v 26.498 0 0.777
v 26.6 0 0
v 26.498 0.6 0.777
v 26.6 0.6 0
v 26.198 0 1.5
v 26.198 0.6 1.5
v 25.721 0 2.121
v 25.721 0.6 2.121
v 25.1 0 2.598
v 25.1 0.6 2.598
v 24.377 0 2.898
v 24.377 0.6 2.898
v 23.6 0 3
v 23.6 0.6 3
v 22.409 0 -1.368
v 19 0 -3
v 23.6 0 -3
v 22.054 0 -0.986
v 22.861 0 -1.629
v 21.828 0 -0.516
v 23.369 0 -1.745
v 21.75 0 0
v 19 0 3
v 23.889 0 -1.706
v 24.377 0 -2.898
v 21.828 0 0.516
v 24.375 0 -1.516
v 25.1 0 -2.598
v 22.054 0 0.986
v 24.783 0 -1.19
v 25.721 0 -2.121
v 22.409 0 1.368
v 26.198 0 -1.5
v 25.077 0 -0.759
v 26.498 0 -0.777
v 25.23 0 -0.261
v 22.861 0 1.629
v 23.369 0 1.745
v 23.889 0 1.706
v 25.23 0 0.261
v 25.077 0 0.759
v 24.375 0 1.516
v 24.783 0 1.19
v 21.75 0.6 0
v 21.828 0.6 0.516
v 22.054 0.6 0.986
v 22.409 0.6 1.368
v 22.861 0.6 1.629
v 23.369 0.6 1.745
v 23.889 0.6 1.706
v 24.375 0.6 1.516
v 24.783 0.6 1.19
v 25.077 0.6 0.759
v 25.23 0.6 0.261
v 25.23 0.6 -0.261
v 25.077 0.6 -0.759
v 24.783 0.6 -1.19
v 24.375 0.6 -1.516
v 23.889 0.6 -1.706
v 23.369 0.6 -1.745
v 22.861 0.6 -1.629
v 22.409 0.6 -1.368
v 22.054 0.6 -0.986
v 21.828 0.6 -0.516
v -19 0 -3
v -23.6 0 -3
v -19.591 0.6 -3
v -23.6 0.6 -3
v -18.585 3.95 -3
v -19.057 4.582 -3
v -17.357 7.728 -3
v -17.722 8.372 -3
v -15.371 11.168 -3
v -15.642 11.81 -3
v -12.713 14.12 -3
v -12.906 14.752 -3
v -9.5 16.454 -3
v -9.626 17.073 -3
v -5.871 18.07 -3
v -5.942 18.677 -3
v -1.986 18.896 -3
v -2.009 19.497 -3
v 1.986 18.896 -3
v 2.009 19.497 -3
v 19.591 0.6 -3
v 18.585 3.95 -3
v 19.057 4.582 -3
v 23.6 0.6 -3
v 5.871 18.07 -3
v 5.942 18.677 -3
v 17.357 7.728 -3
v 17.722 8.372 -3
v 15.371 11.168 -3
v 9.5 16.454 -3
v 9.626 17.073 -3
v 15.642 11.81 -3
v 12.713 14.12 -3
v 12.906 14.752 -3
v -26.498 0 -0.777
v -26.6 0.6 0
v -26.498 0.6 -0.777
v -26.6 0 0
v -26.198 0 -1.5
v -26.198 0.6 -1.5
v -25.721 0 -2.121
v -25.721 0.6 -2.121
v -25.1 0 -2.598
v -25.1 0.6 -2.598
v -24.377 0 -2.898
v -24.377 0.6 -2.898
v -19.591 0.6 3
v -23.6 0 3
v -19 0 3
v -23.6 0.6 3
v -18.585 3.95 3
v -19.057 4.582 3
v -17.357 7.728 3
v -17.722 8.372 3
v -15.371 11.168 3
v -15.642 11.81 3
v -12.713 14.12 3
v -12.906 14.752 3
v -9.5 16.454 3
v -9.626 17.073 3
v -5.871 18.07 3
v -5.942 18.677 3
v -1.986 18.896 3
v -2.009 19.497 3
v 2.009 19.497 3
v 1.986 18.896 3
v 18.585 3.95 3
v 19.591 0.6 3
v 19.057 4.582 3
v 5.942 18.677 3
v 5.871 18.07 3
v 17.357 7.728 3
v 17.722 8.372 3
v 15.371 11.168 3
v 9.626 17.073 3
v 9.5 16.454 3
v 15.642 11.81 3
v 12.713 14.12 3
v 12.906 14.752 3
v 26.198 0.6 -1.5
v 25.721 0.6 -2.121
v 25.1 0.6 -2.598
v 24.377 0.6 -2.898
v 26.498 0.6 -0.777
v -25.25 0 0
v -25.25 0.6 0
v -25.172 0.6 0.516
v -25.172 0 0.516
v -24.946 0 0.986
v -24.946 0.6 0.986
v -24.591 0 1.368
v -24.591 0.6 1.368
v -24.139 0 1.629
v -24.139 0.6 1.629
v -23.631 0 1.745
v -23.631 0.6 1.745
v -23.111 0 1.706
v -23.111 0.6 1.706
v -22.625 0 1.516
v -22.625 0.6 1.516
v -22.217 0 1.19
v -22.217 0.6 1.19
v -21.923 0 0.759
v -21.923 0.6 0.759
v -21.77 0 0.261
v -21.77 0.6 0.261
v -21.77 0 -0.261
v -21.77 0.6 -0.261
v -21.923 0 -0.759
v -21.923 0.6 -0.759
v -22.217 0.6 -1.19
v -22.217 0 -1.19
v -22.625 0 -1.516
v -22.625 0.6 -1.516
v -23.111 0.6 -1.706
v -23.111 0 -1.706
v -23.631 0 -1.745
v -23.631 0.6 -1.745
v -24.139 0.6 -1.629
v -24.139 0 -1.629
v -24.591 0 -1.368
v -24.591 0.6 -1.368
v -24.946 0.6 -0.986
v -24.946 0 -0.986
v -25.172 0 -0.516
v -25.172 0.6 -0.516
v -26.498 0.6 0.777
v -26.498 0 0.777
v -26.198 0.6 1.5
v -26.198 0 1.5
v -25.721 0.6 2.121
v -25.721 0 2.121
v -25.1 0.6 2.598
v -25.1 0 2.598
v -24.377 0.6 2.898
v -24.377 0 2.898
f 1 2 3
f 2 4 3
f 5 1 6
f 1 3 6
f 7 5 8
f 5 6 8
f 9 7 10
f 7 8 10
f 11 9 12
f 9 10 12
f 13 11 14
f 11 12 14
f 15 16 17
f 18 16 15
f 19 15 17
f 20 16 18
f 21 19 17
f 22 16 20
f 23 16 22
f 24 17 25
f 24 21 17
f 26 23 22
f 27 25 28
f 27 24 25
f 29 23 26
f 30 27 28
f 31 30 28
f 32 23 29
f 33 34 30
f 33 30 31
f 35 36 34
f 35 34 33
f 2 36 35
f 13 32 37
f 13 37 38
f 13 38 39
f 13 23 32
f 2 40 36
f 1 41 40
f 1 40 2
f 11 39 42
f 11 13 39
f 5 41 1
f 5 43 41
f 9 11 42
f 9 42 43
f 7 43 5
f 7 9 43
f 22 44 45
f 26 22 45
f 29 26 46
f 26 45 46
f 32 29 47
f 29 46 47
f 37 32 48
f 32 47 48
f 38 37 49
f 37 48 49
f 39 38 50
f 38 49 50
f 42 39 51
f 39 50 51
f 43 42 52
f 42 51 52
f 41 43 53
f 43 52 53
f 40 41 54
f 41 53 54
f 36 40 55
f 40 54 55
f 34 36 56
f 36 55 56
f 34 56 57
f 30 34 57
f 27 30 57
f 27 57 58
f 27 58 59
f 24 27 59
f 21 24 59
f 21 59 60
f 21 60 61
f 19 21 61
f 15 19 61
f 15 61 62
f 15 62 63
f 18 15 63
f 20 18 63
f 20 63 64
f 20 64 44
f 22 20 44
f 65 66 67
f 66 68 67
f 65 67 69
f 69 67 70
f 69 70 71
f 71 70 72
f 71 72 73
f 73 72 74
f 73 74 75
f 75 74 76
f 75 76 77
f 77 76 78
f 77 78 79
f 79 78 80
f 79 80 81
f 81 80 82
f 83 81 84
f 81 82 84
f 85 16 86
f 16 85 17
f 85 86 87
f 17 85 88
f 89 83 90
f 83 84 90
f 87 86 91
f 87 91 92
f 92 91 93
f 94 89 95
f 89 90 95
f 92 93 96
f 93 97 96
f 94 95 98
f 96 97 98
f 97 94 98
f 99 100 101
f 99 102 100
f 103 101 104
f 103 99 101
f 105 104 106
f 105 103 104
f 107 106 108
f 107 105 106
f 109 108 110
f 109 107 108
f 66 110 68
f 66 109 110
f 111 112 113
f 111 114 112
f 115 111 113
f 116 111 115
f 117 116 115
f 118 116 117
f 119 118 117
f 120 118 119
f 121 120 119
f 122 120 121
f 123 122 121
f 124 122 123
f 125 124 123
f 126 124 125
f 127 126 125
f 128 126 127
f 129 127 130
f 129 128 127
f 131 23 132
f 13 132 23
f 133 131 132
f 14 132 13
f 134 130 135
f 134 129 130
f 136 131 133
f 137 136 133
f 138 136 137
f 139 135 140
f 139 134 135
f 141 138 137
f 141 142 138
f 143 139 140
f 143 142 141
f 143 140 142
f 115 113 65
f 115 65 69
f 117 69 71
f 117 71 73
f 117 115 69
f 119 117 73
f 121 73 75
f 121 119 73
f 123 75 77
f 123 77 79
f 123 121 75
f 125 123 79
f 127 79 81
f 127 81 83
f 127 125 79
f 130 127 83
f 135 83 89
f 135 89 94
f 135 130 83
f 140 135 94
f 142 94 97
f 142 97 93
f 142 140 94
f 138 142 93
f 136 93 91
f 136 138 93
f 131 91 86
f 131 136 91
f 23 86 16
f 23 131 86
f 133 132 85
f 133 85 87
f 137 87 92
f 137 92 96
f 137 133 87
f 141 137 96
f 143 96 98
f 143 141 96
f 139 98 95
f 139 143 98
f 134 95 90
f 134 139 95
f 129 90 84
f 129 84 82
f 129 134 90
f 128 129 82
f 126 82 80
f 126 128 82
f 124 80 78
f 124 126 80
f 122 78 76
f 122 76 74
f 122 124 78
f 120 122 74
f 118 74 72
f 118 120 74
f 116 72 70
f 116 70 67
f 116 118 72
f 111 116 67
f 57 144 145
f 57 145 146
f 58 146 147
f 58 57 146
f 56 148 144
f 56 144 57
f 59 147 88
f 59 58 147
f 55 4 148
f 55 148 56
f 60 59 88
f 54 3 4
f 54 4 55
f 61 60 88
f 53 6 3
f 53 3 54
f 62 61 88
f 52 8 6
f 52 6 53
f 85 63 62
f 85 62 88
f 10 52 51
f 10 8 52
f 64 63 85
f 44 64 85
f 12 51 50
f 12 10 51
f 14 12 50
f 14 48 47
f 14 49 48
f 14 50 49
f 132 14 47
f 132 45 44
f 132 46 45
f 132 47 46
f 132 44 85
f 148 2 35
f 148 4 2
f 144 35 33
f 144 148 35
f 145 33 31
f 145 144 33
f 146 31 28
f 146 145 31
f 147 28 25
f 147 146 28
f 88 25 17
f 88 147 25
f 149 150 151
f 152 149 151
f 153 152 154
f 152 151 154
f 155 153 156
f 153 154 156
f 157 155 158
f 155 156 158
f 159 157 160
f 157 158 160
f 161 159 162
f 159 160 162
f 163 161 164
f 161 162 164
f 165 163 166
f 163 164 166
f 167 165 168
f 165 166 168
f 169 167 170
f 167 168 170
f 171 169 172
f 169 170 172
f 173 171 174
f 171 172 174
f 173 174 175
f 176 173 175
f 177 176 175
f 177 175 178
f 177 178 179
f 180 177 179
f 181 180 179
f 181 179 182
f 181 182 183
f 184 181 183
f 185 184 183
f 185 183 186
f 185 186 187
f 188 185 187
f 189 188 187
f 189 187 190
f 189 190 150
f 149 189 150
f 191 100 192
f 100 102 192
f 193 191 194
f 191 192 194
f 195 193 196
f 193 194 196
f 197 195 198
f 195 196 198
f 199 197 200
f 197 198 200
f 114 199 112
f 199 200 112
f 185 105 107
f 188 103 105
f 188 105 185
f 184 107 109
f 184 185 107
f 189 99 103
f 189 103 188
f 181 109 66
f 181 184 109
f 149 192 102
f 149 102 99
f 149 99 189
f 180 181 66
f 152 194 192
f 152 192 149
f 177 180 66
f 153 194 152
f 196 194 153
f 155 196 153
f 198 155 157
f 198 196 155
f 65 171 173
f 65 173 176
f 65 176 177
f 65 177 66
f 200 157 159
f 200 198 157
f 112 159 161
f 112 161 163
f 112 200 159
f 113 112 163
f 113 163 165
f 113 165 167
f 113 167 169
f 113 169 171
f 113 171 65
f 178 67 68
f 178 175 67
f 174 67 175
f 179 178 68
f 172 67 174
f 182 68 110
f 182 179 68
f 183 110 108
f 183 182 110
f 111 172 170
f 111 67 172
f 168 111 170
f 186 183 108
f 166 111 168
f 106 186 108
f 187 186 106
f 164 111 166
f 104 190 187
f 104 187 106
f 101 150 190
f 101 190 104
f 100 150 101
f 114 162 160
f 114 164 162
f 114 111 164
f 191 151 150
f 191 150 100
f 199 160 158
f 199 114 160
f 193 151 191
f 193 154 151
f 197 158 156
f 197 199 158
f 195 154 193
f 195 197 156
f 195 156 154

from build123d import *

# Parameters (mm, degrees)
BOSS_EXTRU_1_DEPTH      = 3
CONG_1_R                = 3
ESQUISSE2_R             = 1.75
ENL_V_MAT_EXTRU_1_DEPTH = 33.826209041


with BuildPart() as part:
    # Esquisse1 → Boss.-Extru.1 (new, symmetric)
    with BuildSketch(Plane.XY):
        with BuildLine():
            Line((-26.6, 0), (-19, 0))
            ThreePointArc((-19, 0), (0, 19), (19, 0))
            Line((19, 0), (26.6, 0))
            Line((26.6, 0), (26.6, 0.6))
            Line((26.6, 0.6), (19.590814174, 0.6))
            ThreePointArc((19.590814174, 0.6), (0, 19.6), (-19.590814174, 0.6))
            Line((-19.590814174, 0.6), (-26.6, 0.6))
            Line((-26.6, 0.6), (-26.6, 0))
        make_face()
    extrude(amount=BOSS_EXTRU_1_DEPTH, both=True)

    # Congé1
    cong_1_edges = [part.edges().sort_by_distance(p)[0] for p in [
        (-26.6, 0.3, -3),
        (-26.6, 0.3, 3),
        (26.6, 0.3, -3),
        (26.6, 0.3, 3),
    ]]
    fillet(cong_1_edges, radius=CONG_1_R - 0.0001)  # a hair under: the kernel refuses the full size

    # Esquisse2 → Enlèv. mat.-Extru.1 (cut, through all)
    with BuildSketch(Plane(origin=(0, 0.6, 0), x_dir=(1, 0, 0), z_dir=(0, 1, 0))):
        with Locations(Location((-23.5, 0, 0), (0, 0, 180))):
            Circle(ESQUISSE2_R)
        with Locations(Location((23.5, 0, 0), (0, 0, 180))):
            Circle(ESQUISSE2_R)
    extrude(amount=-ENL_V_MAT_EXTRU_1_DEPTH, mode=Mode.SUBTRACT)


solid = part.part
